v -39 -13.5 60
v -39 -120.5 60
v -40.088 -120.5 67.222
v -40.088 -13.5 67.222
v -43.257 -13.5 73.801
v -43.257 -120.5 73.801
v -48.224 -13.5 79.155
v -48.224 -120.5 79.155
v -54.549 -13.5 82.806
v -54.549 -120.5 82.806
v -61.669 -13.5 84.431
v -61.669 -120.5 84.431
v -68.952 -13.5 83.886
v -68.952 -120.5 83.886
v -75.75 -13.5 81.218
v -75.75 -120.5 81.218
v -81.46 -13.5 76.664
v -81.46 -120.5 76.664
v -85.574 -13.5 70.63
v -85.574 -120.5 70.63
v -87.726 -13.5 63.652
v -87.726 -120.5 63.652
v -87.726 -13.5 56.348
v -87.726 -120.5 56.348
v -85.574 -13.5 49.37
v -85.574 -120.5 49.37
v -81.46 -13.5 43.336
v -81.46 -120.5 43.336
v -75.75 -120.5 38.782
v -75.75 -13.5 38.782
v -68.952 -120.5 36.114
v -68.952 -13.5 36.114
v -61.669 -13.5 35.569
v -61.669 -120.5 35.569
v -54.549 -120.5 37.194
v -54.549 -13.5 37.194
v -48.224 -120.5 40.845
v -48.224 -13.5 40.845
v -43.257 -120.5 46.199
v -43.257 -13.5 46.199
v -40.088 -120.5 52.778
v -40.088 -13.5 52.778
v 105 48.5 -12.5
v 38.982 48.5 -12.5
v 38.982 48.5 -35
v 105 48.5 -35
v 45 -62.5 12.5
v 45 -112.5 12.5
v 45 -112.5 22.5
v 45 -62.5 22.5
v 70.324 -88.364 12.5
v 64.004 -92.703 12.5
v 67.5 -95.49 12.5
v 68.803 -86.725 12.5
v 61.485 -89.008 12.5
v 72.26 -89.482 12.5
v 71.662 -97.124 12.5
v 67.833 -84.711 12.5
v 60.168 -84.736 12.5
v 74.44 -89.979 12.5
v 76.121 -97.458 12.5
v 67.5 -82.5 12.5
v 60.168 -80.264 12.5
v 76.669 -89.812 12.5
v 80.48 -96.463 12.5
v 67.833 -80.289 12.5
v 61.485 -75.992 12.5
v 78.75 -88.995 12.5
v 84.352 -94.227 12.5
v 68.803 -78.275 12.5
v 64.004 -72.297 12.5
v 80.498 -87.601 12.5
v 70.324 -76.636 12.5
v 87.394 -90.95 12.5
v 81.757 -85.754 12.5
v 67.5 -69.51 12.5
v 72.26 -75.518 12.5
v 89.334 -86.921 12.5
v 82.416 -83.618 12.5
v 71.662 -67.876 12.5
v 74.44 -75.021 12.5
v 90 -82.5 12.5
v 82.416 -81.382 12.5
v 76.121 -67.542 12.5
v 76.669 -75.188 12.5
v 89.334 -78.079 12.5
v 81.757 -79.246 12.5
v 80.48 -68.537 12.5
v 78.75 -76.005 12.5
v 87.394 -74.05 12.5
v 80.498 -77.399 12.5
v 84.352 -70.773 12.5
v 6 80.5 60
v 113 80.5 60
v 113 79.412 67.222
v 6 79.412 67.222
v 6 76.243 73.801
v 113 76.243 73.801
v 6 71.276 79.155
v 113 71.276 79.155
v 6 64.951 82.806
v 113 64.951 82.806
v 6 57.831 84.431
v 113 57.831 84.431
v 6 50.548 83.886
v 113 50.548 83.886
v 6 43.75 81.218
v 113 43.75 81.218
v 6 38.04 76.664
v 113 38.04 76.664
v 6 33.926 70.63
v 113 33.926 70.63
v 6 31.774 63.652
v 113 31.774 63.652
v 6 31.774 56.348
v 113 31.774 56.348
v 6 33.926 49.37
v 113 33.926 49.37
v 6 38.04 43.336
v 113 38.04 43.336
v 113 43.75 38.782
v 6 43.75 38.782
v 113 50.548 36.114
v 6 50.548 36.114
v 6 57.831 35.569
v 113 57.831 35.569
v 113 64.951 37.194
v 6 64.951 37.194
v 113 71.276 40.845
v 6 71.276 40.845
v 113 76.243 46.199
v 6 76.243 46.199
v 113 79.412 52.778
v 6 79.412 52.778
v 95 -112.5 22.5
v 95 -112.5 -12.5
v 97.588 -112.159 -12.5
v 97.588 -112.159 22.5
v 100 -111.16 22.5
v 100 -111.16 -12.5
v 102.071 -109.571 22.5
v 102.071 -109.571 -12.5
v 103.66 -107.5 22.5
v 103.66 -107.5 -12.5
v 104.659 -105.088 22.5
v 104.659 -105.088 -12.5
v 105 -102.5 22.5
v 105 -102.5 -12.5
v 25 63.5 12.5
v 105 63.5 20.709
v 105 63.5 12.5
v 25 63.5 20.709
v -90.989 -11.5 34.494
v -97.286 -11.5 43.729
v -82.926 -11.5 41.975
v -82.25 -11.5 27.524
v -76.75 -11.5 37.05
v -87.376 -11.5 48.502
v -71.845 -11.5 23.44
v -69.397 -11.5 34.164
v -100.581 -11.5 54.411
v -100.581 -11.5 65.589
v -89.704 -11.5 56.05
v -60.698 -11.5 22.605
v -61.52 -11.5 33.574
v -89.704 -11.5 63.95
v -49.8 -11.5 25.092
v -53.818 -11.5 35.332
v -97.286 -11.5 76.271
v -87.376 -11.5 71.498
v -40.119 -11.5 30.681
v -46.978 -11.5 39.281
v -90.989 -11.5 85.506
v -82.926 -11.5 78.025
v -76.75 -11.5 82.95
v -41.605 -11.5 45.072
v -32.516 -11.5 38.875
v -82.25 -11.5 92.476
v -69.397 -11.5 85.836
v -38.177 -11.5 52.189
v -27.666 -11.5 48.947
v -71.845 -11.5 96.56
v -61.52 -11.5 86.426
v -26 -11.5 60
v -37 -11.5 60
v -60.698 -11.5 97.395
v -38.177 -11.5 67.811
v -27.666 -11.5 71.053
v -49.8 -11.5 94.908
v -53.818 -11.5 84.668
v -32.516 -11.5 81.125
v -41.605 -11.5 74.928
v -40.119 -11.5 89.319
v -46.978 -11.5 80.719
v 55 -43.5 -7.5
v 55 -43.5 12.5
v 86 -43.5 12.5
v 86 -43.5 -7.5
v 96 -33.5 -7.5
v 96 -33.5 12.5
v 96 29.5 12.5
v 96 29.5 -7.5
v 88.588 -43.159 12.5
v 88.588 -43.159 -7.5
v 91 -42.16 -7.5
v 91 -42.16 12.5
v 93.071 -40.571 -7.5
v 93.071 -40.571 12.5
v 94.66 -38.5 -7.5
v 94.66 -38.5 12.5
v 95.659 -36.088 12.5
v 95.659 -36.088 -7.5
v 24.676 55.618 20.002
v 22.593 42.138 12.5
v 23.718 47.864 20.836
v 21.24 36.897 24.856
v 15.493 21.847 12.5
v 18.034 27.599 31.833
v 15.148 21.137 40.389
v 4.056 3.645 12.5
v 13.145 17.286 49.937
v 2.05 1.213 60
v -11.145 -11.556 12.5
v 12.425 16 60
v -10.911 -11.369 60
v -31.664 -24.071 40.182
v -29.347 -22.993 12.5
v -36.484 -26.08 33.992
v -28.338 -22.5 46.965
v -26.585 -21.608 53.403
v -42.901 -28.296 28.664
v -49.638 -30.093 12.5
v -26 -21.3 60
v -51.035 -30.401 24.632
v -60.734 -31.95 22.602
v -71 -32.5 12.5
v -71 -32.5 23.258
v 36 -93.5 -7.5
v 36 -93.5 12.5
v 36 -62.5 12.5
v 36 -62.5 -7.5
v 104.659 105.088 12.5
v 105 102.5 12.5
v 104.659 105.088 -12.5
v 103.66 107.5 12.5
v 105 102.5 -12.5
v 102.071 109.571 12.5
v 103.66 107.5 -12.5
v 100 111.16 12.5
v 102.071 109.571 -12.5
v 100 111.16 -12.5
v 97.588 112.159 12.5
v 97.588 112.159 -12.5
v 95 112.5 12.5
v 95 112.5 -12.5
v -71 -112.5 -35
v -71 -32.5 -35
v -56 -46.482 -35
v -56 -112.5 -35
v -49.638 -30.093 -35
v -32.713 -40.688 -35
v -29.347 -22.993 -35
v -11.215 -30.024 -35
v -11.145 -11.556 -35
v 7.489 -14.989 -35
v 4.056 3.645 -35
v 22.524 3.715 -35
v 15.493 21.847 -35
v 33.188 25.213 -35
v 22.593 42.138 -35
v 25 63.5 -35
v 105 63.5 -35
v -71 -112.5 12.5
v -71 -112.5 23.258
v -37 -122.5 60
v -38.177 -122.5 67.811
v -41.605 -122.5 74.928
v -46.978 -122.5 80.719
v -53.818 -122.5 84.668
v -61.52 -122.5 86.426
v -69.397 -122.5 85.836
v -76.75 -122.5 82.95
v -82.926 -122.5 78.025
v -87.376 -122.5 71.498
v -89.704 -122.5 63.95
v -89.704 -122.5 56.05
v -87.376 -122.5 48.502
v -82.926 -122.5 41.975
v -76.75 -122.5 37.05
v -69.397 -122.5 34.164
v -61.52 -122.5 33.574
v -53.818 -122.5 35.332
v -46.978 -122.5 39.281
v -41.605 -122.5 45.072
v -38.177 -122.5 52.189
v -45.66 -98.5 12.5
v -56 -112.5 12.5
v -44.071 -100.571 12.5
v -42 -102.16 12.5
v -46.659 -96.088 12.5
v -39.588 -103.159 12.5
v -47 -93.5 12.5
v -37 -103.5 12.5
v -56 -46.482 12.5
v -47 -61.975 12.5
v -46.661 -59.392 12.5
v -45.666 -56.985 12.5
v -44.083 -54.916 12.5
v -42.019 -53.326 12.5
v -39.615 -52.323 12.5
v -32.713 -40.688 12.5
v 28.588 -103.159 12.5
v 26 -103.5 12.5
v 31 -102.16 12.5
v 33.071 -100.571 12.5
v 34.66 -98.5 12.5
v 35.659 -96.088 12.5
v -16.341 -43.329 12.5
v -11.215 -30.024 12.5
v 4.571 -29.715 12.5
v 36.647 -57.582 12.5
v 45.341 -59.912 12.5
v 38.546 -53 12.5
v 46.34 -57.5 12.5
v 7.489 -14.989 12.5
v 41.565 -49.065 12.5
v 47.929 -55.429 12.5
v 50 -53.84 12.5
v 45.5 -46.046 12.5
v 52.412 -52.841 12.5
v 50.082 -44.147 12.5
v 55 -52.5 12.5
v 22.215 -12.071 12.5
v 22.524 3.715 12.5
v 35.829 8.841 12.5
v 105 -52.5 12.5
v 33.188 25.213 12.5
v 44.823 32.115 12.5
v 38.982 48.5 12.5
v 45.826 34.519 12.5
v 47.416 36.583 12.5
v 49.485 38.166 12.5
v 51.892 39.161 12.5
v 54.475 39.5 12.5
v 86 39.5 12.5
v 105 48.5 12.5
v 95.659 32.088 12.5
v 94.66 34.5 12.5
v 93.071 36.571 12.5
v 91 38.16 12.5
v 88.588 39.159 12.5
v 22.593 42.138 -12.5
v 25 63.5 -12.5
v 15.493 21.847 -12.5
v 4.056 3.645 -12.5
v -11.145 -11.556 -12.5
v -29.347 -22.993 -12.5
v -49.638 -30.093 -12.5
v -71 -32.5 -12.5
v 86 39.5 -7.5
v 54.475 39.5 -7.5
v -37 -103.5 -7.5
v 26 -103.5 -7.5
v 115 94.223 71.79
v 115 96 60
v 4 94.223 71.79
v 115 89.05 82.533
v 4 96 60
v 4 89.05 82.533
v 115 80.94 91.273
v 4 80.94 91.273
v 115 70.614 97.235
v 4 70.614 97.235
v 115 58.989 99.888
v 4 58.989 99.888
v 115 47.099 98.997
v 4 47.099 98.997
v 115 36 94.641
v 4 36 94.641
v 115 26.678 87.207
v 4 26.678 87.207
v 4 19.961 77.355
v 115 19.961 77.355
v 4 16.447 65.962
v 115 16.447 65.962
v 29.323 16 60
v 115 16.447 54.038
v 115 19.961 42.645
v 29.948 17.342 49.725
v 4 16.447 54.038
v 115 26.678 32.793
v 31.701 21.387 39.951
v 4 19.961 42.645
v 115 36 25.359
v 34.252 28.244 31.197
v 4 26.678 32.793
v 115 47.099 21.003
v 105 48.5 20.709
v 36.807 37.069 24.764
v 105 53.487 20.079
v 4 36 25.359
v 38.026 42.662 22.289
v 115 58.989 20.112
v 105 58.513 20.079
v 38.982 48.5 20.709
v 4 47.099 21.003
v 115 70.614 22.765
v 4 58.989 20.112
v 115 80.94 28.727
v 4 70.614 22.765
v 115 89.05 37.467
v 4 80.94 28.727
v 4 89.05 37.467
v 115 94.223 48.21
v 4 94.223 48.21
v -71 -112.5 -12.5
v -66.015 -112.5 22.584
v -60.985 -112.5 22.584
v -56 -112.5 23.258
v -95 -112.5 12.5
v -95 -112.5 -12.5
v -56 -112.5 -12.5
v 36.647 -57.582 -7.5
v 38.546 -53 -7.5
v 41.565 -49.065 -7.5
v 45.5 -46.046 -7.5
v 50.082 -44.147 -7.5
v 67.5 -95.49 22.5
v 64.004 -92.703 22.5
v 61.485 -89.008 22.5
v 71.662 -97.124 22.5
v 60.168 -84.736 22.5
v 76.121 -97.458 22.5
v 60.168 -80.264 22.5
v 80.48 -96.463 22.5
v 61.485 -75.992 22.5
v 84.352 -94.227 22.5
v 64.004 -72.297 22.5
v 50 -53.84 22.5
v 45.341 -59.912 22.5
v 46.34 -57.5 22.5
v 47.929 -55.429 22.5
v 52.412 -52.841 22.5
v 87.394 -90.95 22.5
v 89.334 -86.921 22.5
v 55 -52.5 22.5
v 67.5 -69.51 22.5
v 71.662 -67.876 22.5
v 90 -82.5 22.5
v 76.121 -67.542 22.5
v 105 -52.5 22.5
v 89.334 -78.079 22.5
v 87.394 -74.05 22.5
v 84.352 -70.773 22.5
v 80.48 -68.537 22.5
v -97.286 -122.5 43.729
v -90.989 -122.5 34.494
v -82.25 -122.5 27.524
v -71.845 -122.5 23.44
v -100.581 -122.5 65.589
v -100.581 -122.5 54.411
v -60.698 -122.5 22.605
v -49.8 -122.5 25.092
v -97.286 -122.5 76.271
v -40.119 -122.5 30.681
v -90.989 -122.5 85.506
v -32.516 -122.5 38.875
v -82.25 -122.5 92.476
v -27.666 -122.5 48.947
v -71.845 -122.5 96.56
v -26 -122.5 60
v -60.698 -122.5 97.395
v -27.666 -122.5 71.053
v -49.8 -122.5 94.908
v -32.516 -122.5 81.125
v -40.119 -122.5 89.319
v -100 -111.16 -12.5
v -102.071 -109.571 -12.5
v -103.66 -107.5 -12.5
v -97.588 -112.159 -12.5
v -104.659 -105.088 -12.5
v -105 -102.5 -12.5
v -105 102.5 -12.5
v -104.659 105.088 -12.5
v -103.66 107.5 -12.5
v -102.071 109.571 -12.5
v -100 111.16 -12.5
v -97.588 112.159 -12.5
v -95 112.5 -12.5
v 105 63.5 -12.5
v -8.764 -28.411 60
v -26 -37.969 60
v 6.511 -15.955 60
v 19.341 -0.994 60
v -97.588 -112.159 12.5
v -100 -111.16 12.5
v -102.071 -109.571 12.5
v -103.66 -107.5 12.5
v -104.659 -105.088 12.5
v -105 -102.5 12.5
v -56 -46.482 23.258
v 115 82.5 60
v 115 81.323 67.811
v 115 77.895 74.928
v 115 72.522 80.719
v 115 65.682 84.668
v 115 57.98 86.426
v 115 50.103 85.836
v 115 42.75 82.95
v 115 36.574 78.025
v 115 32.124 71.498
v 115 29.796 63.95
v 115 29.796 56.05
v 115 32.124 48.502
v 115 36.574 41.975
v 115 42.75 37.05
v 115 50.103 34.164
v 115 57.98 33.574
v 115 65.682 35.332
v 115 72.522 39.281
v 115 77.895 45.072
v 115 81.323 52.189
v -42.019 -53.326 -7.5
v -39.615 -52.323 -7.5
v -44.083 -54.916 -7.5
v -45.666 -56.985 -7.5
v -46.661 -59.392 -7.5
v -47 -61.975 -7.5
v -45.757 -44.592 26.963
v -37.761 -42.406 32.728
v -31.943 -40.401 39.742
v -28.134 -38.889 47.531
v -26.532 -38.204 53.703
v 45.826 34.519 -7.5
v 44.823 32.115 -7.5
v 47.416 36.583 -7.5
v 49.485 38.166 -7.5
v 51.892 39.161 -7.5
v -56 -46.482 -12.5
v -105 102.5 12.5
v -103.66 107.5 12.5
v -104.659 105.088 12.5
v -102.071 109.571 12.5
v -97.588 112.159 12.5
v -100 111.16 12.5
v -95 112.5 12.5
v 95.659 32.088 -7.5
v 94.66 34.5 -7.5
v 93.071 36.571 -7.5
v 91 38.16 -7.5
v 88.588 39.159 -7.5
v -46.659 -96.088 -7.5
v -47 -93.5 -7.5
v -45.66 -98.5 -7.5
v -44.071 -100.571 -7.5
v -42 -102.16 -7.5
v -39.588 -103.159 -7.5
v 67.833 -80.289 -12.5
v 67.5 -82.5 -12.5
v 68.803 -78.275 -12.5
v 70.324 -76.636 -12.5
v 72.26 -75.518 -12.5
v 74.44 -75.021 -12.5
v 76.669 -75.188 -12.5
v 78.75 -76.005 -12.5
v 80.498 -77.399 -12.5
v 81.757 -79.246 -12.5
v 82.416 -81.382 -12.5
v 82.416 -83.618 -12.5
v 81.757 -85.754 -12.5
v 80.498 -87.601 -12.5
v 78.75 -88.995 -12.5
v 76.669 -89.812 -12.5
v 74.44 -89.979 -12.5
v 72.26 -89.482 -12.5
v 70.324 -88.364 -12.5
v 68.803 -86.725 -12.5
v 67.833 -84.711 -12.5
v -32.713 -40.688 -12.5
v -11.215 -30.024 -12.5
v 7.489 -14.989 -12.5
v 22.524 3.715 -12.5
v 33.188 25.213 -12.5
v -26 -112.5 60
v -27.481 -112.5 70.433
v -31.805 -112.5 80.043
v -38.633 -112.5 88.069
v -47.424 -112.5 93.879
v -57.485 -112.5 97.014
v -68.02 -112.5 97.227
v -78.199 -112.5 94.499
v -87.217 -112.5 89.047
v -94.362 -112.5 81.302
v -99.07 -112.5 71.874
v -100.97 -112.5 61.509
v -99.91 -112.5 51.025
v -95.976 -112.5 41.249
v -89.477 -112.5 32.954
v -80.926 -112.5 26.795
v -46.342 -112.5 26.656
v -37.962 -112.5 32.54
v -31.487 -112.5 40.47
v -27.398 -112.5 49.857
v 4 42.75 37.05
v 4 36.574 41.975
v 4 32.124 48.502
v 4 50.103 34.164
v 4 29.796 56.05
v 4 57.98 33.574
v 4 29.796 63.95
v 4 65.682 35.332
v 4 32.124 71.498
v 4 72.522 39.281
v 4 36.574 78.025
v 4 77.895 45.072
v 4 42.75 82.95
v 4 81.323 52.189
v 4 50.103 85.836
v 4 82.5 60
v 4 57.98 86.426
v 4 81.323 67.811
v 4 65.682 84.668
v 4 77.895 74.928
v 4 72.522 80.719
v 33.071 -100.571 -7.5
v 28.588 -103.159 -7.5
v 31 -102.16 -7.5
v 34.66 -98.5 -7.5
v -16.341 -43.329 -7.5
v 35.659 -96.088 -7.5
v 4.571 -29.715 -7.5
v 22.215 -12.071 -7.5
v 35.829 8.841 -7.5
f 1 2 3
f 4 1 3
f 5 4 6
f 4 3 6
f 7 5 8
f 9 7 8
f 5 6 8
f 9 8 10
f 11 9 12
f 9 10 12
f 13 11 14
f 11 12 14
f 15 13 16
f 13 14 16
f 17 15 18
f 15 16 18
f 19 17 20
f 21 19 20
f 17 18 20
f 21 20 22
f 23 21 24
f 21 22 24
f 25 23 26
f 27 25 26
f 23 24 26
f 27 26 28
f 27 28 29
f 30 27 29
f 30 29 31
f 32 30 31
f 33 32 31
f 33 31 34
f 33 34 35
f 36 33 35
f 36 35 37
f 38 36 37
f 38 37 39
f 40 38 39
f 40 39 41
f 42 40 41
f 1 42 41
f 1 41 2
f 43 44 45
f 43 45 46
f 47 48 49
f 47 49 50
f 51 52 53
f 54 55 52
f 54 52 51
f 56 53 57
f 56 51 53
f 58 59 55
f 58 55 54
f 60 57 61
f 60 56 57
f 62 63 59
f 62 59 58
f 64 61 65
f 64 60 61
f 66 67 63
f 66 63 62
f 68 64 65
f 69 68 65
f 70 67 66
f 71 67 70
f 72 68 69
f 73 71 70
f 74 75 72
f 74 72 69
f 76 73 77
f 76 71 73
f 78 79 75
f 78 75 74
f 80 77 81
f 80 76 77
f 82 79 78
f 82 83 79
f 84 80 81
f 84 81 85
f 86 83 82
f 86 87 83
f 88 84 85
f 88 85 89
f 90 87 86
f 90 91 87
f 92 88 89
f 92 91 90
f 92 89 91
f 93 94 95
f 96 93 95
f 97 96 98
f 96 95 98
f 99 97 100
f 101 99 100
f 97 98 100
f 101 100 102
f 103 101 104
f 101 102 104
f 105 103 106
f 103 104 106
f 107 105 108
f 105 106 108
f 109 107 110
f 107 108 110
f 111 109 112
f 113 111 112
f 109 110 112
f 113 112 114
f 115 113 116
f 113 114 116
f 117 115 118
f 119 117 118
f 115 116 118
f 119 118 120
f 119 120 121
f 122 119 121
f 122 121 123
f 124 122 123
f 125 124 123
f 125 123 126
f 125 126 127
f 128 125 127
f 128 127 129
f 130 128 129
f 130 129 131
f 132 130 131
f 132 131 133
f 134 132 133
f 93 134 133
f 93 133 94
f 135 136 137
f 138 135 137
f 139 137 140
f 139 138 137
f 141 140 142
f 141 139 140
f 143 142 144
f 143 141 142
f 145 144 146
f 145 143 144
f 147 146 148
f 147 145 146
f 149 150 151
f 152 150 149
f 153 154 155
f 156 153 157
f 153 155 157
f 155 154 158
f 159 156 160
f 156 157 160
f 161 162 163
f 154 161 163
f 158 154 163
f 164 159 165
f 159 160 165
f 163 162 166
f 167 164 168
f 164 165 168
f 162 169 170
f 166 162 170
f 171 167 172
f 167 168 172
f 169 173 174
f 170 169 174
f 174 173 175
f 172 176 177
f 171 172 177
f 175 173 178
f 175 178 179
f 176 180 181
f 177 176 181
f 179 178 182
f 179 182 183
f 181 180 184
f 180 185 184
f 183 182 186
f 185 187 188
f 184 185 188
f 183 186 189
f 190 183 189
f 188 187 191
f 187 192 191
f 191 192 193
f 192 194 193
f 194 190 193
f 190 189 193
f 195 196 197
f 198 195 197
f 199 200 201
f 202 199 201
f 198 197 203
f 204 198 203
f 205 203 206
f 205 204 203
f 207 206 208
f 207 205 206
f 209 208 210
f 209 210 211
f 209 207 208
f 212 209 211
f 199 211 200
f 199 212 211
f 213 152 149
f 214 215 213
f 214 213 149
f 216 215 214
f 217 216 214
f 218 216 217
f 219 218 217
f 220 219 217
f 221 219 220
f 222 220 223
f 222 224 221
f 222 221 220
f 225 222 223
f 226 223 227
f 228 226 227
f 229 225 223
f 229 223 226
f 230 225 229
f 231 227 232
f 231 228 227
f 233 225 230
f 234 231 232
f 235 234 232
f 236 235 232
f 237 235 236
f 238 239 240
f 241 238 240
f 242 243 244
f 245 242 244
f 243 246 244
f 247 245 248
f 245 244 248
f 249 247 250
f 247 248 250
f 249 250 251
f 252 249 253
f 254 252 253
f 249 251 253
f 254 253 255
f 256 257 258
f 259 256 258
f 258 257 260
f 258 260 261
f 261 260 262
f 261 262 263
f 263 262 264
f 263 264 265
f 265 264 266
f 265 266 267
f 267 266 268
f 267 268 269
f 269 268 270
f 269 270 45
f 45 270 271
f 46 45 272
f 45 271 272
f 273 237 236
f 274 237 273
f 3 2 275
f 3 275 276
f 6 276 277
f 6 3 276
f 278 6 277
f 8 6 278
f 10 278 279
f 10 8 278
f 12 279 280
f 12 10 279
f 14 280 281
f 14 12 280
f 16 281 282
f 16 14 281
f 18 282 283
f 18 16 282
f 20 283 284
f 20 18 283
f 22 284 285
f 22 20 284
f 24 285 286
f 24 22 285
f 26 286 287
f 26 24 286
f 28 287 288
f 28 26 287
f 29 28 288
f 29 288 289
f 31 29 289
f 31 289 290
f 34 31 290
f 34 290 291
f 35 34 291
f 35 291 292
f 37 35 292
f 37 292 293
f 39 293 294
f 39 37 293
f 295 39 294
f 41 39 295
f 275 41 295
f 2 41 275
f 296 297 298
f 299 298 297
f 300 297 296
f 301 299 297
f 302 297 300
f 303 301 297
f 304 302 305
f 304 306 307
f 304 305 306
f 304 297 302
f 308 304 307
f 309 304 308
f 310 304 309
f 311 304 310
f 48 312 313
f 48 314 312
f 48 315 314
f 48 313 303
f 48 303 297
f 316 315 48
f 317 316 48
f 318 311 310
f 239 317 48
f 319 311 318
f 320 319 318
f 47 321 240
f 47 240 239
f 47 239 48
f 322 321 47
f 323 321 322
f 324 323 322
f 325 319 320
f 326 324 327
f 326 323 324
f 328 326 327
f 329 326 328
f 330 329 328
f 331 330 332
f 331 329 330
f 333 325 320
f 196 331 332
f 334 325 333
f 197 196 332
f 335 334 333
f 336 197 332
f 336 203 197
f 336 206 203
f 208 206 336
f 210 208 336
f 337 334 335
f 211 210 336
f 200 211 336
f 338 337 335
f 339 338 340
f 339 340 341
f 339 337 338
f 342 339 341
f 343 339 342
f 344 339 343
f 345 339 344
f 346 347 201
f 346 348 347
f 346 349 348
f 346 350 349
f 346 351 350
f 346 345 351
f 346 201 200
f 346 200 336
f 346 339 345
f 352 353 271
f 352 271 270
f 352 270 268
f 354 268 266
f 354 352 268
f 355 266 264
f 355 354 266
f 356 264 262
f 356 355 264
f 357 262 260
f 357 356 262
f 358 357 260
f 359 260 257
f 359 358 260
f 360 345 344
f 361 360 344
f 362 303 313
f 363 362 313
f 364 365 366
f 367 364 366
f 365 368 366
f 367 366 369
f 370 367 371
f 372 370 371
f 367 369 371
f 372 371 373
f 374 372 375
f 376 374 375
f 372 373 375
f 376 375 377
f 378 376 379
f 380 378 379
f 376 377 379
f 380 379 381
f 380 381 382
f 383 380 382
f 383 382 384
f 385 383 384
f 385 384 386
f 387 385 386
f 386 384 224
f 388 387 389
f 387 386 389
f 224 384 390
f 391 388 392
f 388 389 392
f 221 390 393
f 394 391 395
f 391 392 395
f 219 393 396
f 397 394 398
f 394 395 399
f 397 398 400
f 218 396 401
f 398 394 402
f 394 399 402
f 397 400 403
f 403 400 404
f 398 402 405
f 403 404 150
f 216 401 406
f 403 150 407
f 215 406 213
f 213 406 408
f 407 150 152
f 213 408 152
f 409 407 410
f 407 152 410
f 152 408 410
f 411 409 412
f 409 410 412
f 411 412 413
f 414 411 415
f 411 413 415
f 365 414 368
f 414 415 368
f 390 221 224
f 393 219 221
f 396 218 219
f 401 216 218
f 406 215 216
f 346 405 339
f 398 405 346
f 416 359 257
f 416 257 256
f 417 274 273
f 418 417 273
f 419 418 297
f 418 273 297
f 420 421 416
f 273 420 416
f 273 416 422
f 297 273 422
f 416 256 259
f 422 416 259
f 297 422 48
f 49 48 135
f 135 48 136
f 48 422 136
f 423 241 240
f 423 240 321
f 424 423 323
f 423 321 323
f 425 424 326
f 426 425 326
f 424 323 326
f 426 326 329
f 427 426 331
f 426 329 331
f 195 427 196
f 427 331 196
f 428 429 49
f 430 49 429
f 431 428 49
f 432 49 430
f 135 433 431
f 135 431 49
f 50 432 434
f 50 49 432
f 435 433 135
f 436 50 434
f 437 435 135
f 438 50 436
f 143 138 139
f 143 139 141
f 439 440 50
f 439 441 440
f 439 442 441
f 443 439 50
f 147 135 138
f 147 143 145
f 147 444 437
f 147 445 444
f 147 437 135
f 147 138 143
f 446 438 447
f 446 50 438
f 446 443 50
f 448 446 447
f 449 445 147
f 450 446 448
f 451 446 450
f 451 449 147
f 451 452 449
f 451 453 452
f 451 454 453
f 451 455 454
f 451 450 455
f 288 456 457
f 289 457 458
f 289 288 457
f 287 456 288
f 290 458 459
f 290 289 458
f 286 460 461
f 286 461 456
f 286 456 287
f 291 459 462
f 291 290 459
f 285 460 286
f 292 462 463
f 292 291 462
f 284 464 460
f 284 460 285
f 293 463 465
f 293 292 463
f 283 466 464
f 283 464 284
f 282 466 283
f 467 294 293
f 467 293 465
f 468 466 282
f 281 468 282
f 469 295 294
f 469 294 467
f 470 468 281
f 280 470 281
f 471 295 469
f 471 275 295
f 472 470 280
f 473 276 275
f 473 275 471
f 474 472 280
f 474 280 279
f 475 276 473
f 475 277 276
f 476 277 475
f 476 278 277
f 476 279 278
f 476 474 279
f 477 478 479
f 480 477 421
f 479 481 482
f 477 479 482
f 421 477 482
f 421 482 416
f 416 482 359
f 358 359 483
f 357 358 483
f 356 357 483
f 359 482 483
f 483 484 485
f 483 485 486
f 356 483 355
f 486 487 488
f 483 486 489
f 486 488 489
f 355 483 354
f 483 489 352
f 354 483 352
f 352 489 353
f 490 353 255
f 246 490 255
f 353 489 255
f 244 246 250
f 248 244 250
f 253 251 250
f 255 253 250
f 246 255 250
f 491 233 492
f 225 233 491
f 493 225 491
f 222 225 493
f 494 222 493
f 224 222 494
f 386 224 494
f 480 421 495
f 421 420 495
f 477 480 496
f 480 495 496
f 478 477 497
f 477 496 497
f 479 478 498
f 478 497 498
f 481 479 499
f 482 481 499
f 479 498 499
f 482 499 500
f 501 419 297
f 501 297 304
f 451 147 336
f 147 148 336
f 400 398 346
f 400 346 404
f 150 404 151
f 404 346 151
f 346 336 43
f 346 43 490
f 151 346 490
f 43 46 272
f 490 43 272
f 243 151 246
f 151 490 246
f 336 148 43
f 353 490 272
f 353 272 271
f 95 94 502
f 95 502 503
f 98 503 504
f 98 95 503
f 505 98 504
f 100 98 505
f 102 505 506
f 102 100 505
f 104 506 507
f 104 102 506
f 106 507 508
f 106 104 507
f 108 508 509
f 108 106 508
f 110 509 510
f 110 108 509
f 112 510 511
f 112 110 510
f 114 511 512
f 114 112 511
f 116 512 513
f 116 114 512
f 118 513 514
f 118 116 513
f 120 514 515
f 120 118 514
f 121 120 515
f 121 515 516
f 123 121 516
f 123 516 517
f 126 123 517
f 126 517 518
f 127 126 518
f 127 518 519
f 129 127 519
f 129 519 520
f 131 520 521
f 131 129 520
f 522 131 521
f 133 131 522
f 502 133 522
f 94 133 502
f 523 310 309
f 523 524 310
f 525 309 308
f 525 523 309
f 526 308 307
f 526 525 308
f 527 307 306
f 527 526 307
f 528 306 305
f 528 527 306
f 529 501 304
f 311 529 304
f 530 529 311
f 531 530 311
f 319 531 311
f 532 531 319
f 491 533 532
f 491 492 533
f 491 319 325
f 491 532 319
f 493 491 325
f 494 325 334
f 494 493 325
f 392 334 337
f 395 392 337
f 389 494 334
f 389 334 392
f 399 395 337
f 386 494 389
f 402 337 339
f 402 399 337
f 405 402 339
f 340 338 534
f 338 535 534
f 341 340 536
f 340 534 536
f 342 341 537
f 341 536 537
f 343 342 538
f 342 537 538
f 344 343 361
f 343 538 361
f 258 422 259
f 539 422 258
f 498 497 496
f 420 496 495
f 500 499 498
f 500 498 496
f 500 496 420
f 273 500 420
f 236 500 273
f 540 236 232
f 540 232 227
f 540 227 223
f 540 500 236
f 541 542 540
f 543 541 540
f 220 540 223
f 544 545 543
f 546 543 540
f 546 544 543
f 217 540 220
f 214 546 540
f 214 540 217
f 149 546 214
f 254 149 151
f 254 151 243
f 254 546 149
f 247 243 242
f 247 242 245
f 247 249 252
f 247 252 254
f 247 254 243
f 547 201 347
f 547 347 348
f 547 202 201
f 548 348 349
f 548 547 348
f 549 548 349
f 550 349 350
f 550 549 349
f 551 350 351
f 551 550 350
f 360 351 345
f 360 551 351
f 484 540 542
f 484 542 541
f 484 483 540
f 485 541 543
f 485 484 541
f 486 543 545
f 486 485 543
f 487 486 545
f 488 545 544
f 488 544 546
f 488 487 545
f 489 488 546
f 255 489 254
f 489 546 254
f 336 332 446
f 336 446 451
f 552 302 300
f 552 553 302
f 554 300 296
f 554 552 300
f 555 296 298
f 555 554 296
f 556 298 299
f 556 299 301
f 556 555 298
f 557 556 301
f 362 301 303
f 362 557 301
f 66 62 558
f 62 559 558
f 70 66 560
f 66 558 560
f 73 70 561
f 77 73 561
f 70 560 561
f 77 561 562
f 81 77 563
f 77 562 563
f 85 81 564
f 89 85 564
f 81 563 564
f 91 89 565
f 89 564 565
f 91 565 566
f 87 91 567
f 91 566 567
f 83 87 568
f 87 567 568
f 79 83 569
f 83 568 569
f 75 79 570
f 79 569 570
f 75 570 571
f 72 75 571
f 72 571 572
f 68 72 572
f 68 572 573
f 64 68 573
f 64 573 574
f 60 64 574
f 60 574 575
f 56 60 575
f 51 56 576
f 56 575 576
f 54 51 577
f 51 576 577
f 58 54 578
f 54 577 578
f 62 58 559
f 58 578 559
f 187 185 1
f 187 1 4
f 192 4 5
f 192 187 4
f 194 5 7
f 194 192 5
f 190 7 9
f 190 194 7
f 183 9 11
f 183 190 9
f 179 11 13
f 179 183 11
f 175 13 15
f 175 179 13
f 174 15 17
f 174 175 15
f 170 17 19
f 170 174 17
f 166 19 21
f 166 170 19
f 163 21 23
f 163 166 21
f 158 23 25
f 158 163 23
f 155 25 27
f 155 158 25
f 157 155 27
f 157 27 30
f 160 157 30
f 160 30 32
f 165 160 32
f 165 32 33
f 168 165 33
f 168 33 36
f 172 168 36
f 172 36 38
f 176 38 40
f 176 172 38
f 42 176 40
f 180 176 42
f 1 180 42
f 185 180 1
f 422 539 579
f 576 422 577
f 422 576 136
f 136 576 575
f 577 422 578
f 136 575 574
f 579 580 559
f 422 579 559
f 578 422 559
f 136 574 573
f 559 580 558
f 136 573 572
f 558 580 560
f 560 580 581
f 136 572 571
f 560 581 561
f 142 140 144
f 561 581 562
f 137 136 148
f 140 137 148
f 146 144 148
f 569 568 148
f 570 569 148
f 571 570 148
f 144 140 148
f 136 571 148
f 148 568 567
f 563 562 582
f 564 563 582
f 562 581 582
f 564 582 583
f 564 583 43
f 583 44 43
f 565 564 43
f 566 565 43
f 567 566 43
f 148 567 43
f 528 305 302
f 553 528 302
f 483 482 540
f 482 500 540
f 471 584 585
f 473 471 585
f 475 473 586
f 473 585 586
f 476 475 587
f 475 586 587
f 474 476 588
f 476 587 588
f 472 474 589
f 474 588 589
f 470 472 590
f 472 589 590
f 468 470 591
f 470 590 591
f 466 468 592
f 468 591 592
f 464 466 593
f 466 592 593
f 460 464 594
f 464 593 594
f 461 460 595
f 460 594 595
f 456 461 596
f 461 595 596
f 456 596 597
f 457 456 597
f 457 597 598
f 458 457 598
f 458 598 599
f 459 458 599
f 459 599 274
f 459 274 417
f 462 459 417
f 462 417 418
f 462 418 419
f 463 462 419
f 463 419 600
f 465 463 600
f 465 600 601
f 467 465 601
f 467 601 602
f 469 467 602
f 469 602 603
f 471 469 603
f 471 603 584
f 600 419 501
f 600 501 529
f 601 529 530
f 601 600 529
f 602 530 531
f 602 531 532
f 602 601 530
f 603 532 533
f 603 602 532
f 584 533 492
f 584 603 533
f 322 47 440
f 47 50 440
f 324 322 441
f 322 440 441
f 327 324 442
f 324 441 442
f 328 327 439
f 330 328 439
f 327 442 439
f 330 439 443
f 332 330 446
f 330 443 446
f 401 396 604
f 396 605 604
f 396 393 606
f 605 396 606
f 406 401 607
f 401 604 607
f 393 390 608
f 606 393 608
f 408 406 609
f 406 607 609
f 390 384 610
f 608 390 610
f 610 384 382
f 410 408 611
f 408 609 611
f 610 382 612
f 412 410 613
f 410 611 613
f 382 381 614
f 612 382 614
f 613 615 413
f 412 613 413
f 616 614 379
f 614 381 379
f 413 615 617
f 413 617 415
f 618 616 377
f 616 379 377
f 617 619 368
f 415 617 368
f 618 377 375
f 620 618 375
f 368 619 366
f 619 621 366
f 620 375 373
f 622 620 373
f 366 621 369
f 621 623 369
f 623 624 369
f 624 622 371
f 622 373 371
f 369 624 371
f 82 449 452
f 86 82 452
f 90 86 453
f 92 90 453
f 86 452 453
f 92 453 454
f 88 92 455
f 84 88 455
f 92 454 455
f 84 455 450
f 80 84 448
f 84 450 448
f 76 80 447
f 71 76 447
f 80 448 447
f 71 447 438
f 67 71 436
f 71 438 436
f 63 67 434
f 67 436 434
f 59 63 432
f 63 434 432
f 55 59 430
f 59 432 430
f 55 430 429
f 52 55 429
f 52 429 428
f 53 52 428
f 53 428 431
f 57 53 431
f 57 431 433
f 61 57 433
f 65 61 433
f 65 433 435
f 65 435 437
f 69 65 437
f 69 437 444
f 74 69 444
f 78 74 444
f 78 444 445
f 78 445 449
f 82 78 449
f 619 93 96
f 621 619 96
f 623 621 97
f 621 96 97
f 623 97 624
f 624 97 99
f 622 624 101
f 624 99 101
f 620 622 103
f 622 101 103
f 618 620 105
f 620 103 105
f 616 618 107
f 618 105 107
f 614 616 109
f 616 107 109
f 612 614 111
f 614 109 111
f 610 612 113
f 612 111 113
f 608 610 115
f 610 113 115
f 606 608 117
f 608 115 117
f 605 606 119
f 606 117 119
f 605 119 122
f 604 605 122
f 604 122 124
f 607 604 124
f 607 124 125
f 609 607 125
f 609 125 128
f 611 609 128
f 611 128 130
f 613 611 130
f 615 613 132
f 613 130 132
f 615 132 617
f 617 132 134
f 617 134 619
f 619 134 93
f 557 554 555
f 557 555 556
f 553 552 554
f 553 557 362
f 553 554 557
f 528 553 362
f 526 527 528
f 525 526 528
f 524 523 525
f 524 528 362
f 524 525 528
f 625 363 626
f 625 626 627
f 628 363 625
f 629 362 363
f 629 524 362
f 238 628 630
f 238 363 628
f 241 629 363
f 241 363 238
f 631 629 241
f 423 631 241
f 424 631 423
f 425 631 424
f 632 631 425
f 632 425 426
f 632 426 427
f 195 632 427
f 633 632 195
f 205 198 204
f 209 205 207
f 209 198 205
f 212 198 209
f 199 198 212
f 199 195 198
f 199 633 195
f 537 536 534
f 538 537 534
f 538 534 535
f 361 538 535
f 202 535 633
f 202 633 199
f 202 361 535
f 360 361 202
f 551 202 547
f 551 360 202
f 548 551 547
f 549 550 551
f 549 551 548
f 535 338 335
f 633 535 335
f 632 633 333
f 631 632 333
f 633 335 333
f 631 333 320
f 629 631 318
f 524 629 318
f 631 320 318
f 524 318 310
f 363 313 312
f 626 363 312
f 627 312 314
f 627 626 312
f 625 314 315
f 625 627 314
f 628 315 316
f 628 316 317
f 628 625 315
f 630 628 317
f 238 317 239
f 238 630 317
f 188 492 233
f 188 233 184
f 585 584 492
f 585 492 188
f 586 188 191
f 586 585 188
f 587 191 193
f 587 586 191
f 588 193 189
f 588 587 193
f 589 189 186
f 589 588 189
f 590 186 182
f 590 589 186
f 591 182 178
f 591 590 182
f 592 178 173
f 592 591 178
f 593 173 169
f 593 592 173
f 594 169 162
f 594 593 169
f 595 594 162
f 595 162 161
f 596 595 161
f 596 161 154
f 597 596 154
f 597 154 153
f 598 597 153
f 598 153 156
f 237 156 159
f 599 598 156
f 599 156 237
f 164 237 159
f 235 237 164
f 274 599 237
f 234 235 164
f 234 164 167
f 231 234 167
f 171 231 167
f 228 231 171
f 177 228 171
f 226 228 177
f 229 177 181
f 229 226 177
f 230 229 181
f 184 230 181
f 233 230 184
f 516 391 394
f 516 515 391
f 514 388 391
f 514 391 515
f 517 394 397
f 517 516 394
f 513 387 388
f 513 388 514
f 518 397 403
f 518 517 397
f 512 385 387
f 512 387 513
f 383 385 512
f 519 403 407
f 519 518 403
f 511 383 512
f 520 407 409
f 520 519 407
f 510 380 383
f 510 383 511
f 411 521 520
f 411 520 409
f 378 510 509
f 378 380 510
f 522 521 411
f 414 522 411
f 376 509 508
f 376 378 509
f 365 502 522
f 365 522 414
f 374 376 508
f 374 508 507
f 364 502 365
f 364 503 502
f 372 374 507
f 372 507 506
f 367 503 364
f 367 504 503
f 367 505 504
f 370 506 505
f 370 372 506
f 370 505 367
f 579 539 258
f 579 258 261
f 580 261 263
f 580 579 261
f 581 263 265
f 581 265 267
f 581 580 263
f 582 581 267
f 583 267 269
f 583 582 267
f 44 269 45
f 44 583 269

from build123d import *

# Parameters (mm, degrees)
F0_W            = 210
F0_H            = 225
F1_DEPTH        = 12.5
F3_DEPTH        = 47.5
F4_R            = 37.5
F5_DEPTH        = 10
F5_DEPTH_BACK   = 101
F6_R            = 40
F7_DEPTH        = 10
F7_DEPTH_BACK   = 101
F8_W            = 60
F8_H            = 60
F9_DEPTH        = 10
F10_R           = 10
F12_DEPTH       = 20
F14_D           = 1.5
F14_CBORE_D     = 3
F14_CBORE_DEPTH = 1
F16_D           = 15
F16_CBORE_D     = 30
F16_CBORE_DEPTH = 10
F17_R           = 10
F18_R           = 24.5
F19_DEPTH       = 235.001
F20_R           = 24.5
F21_DEPTH       = 220.001
F22_SIZE        = 2


with BuildPart() as f1:
    # F0 (on Top) → F1 (new body, symmetric)
    with BuildSketch(Plane.XY):
        Rectangle(F0_W, F0_H)
    extrude(amount=F1_DEPTH, both=True)

    # F2 (on face) → F3 (join, symmetric)
    with BuildSketch(Plane.XY.offset(12.5)):
        with BuildLine():
            Line((105, 48.5), (105, 63.5))
            Line((105, 63.5), (25, 63.5))
            ThreePointArc((25, 63.5), (-3.1177490061, -4.3822509939), (-71, -32.5))
            Line((-71, -32.5), (-71, -112.5))
            Line((-71, -112.5), (-56, -112.5))
            Line((-56, -112.5), (-56, -46.4818166789))
            ThreePointArc((-56, -46.4818166789), (7.4888527117, -14.9888527117), (38.9818166789, 48.5))
            Line((38.9818166789, 48.5), (105, 48.5))
        make_face()
    extrude(amount=F3_DEPTH, both=True)

    # F4 (on face) → F5 (join, two sides)
    with BuildSketch(Plane.XZ.offset(112.5)) as f5_sk:
        with Locations((-63.5, 60)):
            Circle(F4_R)
    extrude(amount=F5_DEPTH)
    extrude(f5_sk.sketch, amount=-F5_DEPTH_BACK)

    # F6 (on face) → F7 (join, two sides)
    with BuildSketch(Plane.YZ.offset(105)) as f7_sk:
        with Locations((56, 60)):
            Circle(F6_R)
    extrude(amount=F7_DEPTH)
    extrude(f7_sk.sketch, amount=-F7_DEPTH_BACK)

    # F8 (on face) → F9 (join)
    with BuildSketch(Plane.XY.offset(12.5)):
        with Locations((75, -82.5)):
            Rectangle(F8_W, F8_H)
    extrude(amount=F9_DEPTH)

    # F10
    f10_edges = [f1.edges().sort_by_distance(p)[0] for p in [
        (45, -52.5, 17.5),
    ]]
    fillet(f10_edges, radius=F10_R)

    # F11 (on face) → F12 (cut)
    with BuildSketch(Plane.XY.offset(12.5)):
        with BuildLine():
            ThreePointArc((46.5755076536, 39.5), (13.8528137424, -21.3528137424), (-47, -54.0755076536))
            Line((-47, -54.0755076536), (-47, -103.5))
            Line((-47, -103.5), (36, -103.5))
            Line((36, -103.5), (36, -62.5))
            ThreePointArc((36, -62.5), (41.5649711575, -49.0649711575), (55, -43.5))
            Line((55, -43.5), (96, -43.5))
            Line((96, -43.5), (96, 39.5))
            Line((96, 39.5), (46.5755076536, 39.5))
        make_face()
    extrude(amount=-F12_DEPTH, mode=Mode.SUBTRACT)

    # F14 (through all)
    with Locations(Plane.XY.offset(22.5)):
        with Locations((75, -82.5)):
            CounterBoreHole(F14_D / 2, F14_CBORE_D / 2, F14_CBORE_DEPTH)

    # F16 (through all)
    with Locations(Plane.XY.offset(22.5)):
        with Locations((75, -82.5)):
            CounterBoreHole(F16_D / 2, F16_CBORE_D / 2, F16_CBORE_DEPTH)

    # F17
    f17_edges = [f1.edges().sort_by_distance(p)[0] for p in [
        (-47, -54.075508, 2.5),
        (46.575508, 39.5, 2.5),
        (-105, -112.5, 0),
        (105, -112.5, 5),
        (105, 112.5, 0),
        (36, -103.5, 2.5),
        (96, -43.5, 2.5),
        (-47, -103.5, 2.5),
        (96, 39.5, 2.5),
        (-105, 112.5, 0),
    ]]
    fillet(f17_edges, radius=F17_R)

    # F18 (on face) → F19 (cut, through all)
    with BuildSketch(Plane.XZ.offset(122.5)):
        with Locations((-63.5, 60)):
            Circle(F18_R)
    extrude(amount=-F19_DEPTH, mode=Mode.SUBTRACT)

    # F20 (on face) → F21 (cut, through all)
    with BuildSketch(Plane.YZ.offset(115)):
        with Locations((56, 60)):
            Circle(F20_R)
    extrude(amount=-F21_DEPTH, mode=Mode.SUBTRACT)

    # F22
    f22_edges = [f1.edges().sort_by_distance(p)[0] for p in [
        (-88, -122.5, 60),
        (115, 31.5, 60),
        (4, 31.5, 60),
        (-88, -11.5, 60),
    ]]
    chamfer(f22_edges, length=F22_SIZE)


solid = f1.part
